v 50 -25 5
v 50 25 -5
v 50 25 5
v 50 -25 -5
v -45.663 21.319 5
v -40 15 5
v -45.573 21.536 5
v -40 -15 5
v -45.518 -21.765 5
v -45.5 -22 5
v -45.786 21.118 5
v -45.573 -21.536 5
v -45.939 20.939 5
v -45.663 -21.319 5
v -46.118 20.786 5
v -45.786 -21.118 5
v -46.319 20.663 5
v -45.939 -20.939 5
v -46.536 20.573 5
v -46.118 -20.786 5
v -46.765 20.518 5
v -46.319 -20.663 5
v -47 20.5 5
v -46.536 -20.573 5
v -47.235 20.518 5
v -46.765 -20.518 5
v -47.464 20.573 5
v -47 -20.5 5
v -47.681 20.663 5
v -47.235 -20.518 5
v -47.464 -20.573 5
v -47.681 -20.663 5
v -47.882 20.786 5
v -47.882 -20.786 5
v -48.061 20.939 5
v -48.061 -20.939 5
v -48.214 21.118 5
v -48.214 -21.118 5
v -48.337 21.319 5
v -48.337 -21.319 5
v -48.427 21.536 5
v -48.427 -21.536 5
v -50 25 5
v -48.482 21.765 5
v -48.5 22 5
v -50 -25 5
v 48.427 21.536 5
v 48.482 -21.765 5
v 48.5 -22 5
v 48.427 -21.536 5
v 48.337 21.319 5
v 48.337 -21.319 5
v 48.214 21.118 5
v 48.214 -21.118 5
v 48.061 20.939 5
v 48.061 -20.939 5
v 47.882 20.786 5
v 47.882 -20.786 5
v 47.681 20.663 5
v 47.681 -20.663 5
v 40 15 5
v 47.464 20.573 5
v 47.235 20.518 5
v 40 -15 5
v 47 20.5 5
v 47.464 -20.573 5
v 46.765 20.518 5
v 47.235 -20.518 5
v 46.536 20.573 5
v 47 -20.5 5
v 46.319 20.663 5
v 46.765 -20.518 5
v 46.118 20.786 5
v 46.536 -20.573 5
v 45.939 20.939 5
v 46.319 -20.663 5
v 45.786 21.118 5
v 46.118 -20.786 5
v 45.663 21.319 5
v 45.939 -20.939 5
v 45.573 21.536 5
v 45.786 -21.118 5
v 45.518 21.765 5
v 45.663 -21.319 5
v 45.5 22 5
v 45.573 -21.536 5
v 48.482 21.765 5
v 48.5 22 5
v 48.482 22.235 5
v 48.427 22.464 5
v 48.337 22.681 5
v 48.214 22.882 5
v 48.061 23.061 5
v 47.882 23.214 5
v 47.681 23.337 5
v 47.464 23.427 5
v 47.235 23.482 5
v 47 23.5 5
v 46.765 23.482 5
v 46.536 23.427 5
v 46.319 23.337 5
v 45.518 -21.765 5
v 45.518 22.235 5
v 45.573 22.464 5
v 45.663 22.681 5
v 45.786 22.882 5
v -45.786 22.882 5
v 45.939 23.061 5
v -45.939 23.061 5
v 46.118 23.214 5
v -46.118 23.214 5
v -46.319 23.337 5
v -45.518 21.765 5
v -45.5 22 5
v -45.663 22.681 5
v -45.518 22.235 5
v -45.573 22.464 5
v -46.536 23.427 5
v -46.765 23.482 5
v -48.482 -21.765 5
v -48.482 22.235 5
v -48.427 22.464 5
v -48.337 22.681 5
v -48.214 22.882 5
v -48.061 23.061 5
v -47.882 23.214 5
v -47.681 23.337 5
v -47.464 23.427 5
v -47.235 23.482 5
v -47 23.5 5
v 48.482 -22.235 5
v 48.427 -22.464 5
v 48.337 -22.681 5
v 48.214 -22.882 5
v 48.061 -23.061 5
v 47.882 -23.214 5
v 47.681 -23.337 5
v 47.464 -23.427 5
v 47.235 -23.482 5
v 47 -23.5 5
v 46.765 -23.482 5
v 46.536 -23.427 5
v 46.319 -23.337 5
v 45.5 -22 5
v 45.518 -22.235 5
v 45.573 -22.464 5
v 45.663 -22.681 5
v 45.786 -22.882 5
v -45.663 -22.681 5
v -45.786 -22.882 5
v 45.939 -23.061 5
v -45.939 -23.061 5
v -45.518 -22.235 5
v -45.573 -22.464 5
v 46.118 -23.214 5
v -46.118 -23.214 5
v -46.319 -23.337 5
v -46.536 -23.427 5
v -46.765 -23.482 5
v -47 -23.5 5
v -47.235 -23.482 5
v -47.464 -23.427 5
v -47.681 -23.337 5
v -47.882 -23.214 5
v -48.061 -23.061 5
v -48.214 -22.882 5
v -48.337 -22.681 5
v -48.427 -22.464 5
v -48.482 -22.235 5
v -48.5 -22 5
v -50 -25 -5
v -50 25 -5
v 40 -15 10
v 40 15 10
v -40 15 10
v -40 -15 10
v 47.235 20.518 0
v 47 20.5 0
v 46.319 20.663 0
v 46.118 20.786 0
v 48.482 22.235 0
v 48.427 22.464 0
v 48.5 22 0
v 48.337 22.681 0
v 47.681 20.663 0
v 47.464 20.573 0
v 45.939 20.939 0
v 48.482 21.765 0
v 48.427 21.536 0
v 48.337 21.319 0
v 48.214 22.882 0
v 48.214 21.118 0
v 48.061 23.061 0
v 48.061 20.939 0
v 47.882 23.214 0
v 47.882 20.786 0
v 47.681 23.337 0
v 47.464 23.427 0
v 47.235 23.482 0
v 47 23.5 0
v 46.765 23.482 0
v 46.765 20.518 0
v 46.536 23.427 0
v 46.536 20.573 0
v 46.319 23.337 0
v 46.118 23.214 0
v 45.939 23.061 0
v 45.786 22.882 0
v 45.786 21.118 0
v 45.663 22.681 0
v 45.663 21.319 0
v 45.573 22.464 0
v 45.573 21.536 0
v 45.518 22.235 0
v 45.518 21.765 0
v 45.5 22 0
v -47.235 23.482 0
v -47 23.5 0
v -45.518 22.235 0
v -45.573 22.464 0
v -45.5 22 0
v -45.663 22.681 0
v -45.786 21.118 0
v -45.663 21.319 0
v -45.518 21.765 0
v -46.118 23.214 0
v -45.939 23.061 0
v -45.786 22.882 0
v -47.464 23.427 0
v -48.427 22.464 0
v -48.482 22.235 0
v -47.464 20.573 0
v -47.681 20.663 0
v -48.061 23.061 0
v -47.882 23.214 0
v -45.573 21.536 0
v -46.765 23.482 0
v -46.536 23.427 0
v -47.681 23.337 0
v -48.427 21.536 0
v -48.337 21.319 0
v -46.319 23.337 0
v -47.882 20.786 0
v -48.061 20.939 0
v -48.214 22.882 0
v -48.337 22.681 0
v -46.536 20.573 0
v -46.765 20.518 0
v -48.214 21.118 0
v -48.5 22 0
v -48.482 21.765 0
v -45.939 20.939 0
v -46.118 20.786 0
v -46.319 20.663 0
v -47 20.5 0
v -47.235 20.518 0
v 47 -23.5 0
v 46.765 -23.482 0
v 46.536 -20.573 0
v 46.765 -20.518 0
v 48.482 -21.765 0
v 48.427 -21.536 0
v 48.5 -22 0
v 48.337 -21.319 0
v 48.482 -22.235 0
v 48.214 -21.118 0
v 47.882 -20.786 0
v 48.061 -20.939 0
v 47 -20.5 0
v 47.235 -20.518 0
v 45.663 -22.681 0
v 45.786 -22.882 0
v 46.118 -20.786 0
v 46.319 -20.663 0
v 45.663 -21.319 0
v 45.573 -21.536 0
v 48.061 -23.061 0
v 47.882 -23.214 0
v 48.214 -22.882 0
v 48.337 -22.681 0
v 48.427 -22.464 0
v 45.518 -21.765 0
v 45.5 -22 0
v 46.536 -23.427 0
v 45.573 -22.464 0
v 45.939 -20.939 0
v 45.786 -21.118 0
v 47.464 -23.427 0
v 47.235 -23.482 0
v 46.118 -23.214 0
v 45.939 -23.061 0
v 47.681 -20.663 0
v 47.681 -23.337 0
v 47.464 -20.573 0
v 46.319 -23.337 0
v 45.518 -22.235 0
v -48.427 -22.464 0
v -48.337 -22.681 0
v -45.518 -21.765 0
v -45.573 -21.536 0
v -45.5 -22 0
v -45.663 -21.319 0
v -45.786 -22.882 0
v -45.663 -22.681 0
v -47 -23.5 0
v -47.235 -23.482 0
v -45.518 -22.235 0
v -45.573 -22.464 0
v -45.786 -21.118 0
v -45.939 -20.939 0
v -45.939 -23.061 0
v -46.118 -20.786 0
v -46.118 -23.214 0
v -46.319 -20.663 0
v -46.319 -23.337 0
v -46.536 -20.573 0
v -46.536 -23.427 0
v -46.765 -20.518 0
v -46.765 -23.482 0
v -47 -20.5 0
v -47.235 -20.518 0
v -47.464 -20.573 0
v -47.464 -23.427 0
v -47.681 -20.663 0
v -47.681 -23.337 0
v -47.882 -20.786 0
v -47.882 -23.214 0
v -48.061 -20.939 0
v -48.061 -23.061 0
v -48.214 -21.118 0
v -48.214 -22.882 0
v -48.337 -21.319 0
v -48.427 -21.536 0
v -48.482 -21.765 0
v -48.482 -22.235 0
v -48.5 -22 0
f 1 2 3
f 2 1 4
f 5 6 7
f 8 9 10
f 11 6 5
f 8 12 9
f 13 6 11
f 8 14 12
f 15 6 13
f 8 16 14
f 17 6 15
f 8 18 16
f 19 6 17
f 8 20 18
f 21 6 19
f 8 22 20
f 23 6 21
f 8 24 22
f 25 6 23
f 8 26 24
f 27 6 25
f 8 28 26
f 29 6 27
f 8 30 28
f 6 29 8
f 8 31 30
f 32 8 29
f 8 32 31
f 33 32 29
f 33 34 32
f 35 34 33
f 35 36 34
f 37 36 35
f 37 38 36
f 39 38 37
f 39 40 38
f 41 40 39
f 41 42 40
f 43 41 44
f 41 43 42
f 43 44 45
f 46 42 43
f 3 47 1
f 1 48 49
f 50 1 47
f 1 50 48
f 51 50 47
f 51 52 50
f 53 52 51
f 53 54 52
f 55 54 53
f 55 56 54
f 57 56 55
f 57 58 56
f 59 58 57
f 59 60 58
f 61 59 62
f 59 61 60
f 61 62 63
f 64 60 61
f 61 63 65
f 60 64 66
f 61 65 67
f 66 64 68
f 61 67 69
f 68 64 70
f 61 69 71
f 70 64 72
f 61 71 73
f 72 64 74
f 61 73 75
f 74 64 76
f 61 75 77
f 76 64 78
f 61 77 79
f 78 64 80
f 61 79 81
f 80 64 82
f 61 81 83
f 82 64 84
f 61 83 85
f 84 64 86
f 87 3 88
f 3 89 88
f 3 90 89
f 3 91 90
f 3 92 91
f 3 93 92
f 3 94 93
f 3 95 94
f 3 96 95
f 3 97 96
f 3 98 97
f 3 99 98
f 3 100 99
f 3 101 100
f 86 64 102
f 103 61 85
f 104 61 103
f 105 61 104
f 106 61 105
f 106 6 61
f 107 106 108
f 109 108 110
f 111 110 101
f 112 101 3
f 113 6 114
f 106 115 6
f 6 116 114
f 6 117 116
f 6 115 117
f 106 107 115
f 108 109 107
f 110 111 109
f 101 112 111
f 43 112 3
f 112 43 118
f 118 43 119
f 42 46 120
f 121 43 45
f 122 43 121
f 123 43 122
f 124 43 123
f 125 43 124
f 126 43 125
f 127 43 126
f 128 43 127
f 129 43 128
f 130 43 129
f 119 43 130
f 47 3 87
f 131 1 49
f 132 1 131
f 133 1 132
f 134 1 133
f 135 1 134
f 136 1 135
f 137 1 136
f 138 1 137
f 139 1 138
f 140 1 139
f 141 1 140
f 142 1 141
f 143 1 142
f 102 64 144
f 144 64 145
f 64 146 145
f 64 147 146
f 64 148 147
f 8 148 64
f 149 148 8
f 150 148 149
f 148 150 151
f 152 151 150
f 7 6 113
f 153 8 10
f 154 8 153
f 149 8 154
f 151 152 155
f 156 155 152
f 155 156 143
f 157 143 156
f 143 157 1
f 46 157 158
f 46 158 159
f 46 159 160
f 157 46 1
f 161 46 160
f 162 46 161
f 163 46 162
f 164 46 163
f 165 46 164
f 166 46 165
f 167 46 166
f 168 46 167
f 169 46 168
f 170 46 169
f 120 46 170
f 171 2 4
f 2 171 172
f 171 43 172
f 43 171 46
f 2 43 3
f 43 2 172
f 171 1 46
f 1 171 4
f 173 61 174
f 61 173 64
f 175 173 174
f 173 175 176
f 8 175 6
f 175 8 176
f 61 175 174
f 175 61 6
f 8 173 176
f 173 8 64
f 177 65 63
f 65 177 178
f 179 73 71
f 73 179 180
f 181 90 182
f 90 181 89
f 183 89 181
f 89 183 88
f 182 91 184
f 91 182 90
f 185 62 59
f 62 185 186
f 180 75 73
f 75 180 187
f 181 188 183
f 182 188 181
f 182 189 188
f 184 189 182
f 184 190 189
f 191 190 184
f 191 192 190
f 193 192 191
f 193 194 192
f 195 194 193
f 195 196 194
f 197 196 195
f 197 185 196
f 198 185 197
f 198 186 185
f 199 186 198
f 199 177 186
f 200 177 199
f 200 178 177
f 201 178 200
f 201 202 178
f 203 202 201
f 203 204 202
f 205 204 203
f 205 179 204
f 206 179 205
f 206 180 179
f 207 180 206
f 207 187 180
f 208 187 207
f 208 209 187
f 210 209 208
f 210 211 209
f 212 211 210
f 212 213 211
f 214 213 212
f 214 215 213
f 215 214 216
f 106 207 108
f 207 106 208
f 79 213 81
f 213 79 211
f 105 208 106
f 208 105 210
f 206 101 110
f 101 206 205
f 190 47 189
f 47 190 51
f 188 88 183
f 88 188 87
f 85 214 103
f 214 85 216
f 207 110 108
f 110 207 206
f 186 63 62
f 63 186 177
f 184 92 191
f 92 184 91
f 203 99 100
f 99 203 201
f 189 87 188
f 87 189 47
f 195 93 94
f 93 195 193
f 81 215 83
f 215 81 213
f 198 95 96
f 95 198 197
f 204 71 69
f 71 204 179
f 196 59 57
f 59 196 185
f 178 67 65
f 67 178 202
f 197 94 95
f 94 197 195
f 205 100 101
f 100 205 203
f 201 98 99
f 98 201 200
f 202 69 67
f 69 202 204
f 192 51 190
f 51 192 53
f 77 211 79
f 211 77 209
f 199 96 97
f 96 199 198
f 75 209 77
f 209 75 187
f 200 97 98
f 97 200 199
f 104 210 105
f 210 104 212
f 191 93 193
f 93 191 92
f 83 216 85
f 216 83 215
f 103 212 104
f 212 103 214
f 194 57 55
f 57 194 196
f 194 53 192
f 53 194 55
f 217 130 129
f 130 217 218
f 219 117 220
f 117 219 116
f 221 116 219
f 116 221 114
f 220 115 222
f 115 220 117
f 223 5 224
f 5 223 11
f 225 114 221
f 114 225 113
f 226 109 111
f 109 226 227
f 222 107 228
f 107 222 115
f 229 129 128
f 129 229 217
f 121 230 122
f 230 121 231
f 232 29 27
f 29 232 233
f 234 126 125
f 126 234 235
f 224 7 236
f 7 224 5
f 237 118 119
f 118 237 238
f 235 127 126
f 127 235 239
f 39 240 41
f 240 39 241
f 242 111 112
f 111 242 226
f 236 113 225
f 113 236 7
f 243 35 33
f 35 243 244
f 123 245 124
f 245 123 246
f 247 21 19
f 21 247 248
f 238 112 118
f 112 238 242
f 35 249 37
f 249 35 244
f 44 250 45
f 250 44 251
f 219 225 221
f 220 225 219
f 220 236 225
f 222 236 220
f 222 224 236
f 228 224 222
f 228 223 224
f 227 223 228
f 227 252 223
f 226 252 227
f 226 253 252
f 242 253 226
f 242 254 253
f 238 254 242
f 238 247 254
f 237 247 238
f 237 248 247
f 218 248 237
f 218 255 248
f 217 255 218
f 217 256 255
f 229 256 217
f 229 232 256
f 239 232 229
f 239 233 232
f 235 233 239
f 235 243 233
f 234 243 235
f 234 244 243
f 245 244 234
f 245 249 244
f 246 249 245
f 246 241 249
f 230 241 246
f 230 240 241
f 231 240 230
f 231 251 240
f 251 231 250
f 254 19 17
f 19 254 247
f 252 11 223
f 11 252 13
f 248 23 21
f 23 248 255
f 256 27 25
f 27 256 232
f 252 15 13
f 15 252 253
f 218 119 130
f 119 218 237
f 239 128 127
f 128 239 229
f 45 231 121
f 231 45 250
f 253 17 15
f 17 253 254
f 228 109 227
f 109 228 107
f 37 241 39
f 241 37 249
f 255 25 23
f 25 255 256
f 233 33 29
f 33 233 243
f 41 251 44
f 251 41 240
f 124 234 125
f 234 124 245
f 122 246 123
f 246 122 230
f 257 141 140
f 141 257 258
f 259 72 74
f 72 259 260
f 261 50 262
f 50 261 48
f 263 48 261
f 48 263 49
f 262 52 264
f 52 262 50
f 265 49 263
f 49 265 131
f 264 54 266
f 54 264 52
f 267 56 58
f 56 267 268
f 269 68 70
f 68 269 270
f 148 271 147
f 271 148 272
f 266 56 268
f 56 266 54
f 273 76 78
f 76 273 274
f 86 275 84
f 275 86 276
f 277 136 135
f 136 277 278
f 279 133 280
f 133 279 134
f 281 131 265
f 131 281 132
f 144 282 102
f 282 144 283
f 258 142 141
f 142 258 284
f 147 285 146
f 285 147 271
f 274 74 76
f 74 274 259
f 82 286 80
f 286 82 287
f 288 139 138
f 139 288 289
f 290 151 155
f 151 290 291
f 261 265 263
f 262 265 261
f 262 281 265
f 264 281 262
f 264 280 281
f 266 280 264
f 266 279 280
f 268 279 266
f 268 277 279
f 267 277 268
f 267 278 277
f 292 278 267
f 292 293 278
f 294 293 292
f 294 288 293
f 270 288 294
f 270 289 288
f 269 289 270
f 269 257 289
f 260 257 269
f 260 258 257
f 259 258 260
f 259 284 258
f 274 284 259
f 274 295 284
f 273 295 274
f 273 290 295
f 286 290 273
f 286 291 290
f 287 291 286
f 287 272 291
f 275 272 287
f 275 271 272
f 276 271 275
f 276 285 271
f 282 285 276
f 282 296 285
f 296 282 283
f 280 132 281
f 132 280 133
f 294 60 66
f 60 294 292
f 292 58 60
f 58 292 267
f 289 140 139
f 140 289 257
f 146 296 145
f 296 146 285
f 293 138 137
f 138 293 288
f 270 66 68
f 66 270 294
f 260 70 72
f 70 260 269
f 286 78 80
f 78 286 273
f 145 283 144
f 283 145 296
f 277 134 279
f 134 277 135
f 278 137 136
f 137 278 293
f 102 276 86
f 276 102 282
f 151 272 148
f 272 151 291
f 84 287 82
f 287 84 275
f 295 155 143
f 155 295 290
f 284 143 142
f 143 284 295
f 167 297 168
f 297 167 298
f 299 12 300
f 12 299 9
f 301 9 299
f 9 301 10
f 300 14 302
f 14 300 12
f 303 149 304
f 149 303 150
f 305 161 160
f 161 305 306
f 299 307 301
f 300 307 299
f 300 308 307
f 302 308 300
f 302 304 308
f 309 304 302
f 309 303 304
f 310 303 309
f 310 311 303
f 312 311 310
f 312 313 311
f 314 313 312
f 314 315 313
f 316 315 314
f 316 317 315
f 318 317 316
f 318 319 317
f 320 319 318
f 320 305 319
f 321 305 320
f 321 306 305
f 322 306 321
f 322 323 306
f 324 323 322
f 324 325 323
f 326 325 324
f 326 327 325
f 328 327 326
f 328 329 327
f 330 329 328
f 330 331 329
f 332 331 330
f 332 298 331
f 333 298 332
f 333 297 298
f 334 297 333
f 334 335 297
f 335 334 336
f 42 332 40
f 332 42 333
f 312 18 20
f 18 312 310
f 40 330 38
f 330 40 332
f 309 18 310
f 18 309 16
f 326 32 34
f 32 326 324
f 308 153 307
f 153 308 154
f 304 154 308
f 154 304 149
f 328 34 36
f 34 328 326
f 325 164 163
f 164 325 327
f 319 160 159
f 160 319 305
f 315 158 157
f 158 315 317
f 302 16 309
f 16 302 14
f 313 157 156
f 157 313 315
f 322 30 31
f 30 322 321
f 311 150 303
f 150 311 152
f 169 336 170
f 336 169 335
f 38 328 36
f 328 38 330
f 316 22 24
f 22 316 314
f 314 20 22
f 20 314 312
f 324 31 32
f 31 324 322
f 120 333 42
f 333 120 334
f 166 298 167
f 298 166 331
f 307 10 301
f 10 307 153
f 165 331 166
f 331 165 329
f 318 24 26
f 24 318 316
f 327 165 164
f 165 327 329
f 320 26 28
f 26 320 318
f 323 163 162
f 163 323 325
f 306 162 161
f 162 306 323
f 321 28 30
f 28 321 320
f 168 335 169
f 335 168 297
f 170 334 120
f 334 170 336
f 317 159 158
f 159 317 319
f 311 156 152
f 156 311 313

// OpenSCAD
$fn = 40;

difference() {
    union() {
        cube([100, 50, 10], center = true);
        translate([0, 0, 7.5])
            cube([80, 30, 5], center = true);
    }
    
    translate([47, 22, 0])
        cylinder(h = 5.1, d = 3);
    translate([-47, 22, 0])
        cylinder(h = 5.1, d = 3);
    translate([47, -22, 0])
        cylinder(h = 5.1, d = 3);
    translate([-47, -22, 0])
        cylinder(h = 5.1, d = 3);
}

// For smooth cyls: http://forum.openscad.org/Round-shapes-created-in-openscad-are-not-smooth-but-hexigonal-td24407.html
//  For 3D printing I set $fa to 6 and $fs to half the extrusion width. That gives 60 sides for large circles (best to make it a multiple of four). Smaller circles hit the $fs limit and have less sides
